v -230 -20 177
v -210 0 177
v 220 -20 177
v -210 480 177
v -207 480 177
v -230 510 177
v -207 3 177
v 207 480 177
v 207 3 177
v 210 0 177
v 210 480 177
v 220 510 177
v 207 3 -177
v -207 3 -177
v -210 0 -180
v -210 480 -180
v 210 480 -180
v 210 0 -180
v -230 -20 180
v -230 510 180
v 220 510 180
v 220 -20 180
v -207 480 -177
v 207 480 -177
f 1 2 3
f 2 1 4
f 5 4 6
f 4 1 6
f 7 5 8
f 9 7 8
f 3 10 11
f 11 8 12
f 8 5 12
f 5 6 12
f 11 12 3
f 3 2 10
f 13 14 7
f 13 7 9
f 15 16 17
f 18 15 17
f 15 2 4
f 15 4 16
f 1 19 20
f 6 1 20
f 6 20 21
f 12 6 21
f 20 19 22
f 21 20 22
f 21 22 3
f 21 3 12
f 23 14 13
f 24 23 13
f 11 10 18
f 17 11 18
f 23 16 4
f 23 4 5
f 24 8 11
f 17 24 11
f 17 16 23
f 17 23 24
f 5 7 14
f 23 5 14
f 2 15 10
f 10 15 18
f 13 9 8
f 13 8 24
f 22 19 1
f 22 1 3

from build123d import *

# Parameters (mm, degrees)
SKETCH_1_W        = 420
SKETCH_1_H        = 360
EXTRUDE_1_DEPTH   = 3
SKETCH_2_W        = 420
SKETCH_2_H        = 360
SKETCH_2_W_2      = 414
SKETCH_2_H_2      = 354
EXTRUDE_1_2_DEPTH = 477
SKETCH_3_W        = 450
SKETCH_3_H        = 530
EXTRUDE_2_DEPTH   = 3


with BuildPart() as part:
    # 草图1 → Extrude 1 (new body)
    with BuildSketch(Plane(origin=(0, 0, 0), x_dir=(1, 0, 0), z_dir=(0, 1, 0))):
        Rectangle(SKETCH_1_W, SKETCH_1_H)
    extrude(amount=EXTRUDE_1_DEPTH)

    # 草图2 → Extrude 1 2 (add)
    with BuildSketch(Plane(origin=(0, 3, 0), x_dir=(1, 0, 0), z_dir=(0, 1, 0))):
        Rectangle(SKETCH_2_W, SKETCH_2_H)
        Rectangle(SKETCH_2_W_2, SKETCH_2_H_2, mode=Mode.SUBTRACT)
    extrude(amount=EXTRUDE_1_2_DEPTH)

    # 草图3 → 凸台-拉伸2 (add)
    with BuildSketch(Plane.XY.offset(180)):
        with Locations((-5, 245)):
            Rectangle(SKETCH_3_W, SKETCH_3_H)
    extrude(amount=-EXTRUDE_2_DEPTH)


solid = part.part
